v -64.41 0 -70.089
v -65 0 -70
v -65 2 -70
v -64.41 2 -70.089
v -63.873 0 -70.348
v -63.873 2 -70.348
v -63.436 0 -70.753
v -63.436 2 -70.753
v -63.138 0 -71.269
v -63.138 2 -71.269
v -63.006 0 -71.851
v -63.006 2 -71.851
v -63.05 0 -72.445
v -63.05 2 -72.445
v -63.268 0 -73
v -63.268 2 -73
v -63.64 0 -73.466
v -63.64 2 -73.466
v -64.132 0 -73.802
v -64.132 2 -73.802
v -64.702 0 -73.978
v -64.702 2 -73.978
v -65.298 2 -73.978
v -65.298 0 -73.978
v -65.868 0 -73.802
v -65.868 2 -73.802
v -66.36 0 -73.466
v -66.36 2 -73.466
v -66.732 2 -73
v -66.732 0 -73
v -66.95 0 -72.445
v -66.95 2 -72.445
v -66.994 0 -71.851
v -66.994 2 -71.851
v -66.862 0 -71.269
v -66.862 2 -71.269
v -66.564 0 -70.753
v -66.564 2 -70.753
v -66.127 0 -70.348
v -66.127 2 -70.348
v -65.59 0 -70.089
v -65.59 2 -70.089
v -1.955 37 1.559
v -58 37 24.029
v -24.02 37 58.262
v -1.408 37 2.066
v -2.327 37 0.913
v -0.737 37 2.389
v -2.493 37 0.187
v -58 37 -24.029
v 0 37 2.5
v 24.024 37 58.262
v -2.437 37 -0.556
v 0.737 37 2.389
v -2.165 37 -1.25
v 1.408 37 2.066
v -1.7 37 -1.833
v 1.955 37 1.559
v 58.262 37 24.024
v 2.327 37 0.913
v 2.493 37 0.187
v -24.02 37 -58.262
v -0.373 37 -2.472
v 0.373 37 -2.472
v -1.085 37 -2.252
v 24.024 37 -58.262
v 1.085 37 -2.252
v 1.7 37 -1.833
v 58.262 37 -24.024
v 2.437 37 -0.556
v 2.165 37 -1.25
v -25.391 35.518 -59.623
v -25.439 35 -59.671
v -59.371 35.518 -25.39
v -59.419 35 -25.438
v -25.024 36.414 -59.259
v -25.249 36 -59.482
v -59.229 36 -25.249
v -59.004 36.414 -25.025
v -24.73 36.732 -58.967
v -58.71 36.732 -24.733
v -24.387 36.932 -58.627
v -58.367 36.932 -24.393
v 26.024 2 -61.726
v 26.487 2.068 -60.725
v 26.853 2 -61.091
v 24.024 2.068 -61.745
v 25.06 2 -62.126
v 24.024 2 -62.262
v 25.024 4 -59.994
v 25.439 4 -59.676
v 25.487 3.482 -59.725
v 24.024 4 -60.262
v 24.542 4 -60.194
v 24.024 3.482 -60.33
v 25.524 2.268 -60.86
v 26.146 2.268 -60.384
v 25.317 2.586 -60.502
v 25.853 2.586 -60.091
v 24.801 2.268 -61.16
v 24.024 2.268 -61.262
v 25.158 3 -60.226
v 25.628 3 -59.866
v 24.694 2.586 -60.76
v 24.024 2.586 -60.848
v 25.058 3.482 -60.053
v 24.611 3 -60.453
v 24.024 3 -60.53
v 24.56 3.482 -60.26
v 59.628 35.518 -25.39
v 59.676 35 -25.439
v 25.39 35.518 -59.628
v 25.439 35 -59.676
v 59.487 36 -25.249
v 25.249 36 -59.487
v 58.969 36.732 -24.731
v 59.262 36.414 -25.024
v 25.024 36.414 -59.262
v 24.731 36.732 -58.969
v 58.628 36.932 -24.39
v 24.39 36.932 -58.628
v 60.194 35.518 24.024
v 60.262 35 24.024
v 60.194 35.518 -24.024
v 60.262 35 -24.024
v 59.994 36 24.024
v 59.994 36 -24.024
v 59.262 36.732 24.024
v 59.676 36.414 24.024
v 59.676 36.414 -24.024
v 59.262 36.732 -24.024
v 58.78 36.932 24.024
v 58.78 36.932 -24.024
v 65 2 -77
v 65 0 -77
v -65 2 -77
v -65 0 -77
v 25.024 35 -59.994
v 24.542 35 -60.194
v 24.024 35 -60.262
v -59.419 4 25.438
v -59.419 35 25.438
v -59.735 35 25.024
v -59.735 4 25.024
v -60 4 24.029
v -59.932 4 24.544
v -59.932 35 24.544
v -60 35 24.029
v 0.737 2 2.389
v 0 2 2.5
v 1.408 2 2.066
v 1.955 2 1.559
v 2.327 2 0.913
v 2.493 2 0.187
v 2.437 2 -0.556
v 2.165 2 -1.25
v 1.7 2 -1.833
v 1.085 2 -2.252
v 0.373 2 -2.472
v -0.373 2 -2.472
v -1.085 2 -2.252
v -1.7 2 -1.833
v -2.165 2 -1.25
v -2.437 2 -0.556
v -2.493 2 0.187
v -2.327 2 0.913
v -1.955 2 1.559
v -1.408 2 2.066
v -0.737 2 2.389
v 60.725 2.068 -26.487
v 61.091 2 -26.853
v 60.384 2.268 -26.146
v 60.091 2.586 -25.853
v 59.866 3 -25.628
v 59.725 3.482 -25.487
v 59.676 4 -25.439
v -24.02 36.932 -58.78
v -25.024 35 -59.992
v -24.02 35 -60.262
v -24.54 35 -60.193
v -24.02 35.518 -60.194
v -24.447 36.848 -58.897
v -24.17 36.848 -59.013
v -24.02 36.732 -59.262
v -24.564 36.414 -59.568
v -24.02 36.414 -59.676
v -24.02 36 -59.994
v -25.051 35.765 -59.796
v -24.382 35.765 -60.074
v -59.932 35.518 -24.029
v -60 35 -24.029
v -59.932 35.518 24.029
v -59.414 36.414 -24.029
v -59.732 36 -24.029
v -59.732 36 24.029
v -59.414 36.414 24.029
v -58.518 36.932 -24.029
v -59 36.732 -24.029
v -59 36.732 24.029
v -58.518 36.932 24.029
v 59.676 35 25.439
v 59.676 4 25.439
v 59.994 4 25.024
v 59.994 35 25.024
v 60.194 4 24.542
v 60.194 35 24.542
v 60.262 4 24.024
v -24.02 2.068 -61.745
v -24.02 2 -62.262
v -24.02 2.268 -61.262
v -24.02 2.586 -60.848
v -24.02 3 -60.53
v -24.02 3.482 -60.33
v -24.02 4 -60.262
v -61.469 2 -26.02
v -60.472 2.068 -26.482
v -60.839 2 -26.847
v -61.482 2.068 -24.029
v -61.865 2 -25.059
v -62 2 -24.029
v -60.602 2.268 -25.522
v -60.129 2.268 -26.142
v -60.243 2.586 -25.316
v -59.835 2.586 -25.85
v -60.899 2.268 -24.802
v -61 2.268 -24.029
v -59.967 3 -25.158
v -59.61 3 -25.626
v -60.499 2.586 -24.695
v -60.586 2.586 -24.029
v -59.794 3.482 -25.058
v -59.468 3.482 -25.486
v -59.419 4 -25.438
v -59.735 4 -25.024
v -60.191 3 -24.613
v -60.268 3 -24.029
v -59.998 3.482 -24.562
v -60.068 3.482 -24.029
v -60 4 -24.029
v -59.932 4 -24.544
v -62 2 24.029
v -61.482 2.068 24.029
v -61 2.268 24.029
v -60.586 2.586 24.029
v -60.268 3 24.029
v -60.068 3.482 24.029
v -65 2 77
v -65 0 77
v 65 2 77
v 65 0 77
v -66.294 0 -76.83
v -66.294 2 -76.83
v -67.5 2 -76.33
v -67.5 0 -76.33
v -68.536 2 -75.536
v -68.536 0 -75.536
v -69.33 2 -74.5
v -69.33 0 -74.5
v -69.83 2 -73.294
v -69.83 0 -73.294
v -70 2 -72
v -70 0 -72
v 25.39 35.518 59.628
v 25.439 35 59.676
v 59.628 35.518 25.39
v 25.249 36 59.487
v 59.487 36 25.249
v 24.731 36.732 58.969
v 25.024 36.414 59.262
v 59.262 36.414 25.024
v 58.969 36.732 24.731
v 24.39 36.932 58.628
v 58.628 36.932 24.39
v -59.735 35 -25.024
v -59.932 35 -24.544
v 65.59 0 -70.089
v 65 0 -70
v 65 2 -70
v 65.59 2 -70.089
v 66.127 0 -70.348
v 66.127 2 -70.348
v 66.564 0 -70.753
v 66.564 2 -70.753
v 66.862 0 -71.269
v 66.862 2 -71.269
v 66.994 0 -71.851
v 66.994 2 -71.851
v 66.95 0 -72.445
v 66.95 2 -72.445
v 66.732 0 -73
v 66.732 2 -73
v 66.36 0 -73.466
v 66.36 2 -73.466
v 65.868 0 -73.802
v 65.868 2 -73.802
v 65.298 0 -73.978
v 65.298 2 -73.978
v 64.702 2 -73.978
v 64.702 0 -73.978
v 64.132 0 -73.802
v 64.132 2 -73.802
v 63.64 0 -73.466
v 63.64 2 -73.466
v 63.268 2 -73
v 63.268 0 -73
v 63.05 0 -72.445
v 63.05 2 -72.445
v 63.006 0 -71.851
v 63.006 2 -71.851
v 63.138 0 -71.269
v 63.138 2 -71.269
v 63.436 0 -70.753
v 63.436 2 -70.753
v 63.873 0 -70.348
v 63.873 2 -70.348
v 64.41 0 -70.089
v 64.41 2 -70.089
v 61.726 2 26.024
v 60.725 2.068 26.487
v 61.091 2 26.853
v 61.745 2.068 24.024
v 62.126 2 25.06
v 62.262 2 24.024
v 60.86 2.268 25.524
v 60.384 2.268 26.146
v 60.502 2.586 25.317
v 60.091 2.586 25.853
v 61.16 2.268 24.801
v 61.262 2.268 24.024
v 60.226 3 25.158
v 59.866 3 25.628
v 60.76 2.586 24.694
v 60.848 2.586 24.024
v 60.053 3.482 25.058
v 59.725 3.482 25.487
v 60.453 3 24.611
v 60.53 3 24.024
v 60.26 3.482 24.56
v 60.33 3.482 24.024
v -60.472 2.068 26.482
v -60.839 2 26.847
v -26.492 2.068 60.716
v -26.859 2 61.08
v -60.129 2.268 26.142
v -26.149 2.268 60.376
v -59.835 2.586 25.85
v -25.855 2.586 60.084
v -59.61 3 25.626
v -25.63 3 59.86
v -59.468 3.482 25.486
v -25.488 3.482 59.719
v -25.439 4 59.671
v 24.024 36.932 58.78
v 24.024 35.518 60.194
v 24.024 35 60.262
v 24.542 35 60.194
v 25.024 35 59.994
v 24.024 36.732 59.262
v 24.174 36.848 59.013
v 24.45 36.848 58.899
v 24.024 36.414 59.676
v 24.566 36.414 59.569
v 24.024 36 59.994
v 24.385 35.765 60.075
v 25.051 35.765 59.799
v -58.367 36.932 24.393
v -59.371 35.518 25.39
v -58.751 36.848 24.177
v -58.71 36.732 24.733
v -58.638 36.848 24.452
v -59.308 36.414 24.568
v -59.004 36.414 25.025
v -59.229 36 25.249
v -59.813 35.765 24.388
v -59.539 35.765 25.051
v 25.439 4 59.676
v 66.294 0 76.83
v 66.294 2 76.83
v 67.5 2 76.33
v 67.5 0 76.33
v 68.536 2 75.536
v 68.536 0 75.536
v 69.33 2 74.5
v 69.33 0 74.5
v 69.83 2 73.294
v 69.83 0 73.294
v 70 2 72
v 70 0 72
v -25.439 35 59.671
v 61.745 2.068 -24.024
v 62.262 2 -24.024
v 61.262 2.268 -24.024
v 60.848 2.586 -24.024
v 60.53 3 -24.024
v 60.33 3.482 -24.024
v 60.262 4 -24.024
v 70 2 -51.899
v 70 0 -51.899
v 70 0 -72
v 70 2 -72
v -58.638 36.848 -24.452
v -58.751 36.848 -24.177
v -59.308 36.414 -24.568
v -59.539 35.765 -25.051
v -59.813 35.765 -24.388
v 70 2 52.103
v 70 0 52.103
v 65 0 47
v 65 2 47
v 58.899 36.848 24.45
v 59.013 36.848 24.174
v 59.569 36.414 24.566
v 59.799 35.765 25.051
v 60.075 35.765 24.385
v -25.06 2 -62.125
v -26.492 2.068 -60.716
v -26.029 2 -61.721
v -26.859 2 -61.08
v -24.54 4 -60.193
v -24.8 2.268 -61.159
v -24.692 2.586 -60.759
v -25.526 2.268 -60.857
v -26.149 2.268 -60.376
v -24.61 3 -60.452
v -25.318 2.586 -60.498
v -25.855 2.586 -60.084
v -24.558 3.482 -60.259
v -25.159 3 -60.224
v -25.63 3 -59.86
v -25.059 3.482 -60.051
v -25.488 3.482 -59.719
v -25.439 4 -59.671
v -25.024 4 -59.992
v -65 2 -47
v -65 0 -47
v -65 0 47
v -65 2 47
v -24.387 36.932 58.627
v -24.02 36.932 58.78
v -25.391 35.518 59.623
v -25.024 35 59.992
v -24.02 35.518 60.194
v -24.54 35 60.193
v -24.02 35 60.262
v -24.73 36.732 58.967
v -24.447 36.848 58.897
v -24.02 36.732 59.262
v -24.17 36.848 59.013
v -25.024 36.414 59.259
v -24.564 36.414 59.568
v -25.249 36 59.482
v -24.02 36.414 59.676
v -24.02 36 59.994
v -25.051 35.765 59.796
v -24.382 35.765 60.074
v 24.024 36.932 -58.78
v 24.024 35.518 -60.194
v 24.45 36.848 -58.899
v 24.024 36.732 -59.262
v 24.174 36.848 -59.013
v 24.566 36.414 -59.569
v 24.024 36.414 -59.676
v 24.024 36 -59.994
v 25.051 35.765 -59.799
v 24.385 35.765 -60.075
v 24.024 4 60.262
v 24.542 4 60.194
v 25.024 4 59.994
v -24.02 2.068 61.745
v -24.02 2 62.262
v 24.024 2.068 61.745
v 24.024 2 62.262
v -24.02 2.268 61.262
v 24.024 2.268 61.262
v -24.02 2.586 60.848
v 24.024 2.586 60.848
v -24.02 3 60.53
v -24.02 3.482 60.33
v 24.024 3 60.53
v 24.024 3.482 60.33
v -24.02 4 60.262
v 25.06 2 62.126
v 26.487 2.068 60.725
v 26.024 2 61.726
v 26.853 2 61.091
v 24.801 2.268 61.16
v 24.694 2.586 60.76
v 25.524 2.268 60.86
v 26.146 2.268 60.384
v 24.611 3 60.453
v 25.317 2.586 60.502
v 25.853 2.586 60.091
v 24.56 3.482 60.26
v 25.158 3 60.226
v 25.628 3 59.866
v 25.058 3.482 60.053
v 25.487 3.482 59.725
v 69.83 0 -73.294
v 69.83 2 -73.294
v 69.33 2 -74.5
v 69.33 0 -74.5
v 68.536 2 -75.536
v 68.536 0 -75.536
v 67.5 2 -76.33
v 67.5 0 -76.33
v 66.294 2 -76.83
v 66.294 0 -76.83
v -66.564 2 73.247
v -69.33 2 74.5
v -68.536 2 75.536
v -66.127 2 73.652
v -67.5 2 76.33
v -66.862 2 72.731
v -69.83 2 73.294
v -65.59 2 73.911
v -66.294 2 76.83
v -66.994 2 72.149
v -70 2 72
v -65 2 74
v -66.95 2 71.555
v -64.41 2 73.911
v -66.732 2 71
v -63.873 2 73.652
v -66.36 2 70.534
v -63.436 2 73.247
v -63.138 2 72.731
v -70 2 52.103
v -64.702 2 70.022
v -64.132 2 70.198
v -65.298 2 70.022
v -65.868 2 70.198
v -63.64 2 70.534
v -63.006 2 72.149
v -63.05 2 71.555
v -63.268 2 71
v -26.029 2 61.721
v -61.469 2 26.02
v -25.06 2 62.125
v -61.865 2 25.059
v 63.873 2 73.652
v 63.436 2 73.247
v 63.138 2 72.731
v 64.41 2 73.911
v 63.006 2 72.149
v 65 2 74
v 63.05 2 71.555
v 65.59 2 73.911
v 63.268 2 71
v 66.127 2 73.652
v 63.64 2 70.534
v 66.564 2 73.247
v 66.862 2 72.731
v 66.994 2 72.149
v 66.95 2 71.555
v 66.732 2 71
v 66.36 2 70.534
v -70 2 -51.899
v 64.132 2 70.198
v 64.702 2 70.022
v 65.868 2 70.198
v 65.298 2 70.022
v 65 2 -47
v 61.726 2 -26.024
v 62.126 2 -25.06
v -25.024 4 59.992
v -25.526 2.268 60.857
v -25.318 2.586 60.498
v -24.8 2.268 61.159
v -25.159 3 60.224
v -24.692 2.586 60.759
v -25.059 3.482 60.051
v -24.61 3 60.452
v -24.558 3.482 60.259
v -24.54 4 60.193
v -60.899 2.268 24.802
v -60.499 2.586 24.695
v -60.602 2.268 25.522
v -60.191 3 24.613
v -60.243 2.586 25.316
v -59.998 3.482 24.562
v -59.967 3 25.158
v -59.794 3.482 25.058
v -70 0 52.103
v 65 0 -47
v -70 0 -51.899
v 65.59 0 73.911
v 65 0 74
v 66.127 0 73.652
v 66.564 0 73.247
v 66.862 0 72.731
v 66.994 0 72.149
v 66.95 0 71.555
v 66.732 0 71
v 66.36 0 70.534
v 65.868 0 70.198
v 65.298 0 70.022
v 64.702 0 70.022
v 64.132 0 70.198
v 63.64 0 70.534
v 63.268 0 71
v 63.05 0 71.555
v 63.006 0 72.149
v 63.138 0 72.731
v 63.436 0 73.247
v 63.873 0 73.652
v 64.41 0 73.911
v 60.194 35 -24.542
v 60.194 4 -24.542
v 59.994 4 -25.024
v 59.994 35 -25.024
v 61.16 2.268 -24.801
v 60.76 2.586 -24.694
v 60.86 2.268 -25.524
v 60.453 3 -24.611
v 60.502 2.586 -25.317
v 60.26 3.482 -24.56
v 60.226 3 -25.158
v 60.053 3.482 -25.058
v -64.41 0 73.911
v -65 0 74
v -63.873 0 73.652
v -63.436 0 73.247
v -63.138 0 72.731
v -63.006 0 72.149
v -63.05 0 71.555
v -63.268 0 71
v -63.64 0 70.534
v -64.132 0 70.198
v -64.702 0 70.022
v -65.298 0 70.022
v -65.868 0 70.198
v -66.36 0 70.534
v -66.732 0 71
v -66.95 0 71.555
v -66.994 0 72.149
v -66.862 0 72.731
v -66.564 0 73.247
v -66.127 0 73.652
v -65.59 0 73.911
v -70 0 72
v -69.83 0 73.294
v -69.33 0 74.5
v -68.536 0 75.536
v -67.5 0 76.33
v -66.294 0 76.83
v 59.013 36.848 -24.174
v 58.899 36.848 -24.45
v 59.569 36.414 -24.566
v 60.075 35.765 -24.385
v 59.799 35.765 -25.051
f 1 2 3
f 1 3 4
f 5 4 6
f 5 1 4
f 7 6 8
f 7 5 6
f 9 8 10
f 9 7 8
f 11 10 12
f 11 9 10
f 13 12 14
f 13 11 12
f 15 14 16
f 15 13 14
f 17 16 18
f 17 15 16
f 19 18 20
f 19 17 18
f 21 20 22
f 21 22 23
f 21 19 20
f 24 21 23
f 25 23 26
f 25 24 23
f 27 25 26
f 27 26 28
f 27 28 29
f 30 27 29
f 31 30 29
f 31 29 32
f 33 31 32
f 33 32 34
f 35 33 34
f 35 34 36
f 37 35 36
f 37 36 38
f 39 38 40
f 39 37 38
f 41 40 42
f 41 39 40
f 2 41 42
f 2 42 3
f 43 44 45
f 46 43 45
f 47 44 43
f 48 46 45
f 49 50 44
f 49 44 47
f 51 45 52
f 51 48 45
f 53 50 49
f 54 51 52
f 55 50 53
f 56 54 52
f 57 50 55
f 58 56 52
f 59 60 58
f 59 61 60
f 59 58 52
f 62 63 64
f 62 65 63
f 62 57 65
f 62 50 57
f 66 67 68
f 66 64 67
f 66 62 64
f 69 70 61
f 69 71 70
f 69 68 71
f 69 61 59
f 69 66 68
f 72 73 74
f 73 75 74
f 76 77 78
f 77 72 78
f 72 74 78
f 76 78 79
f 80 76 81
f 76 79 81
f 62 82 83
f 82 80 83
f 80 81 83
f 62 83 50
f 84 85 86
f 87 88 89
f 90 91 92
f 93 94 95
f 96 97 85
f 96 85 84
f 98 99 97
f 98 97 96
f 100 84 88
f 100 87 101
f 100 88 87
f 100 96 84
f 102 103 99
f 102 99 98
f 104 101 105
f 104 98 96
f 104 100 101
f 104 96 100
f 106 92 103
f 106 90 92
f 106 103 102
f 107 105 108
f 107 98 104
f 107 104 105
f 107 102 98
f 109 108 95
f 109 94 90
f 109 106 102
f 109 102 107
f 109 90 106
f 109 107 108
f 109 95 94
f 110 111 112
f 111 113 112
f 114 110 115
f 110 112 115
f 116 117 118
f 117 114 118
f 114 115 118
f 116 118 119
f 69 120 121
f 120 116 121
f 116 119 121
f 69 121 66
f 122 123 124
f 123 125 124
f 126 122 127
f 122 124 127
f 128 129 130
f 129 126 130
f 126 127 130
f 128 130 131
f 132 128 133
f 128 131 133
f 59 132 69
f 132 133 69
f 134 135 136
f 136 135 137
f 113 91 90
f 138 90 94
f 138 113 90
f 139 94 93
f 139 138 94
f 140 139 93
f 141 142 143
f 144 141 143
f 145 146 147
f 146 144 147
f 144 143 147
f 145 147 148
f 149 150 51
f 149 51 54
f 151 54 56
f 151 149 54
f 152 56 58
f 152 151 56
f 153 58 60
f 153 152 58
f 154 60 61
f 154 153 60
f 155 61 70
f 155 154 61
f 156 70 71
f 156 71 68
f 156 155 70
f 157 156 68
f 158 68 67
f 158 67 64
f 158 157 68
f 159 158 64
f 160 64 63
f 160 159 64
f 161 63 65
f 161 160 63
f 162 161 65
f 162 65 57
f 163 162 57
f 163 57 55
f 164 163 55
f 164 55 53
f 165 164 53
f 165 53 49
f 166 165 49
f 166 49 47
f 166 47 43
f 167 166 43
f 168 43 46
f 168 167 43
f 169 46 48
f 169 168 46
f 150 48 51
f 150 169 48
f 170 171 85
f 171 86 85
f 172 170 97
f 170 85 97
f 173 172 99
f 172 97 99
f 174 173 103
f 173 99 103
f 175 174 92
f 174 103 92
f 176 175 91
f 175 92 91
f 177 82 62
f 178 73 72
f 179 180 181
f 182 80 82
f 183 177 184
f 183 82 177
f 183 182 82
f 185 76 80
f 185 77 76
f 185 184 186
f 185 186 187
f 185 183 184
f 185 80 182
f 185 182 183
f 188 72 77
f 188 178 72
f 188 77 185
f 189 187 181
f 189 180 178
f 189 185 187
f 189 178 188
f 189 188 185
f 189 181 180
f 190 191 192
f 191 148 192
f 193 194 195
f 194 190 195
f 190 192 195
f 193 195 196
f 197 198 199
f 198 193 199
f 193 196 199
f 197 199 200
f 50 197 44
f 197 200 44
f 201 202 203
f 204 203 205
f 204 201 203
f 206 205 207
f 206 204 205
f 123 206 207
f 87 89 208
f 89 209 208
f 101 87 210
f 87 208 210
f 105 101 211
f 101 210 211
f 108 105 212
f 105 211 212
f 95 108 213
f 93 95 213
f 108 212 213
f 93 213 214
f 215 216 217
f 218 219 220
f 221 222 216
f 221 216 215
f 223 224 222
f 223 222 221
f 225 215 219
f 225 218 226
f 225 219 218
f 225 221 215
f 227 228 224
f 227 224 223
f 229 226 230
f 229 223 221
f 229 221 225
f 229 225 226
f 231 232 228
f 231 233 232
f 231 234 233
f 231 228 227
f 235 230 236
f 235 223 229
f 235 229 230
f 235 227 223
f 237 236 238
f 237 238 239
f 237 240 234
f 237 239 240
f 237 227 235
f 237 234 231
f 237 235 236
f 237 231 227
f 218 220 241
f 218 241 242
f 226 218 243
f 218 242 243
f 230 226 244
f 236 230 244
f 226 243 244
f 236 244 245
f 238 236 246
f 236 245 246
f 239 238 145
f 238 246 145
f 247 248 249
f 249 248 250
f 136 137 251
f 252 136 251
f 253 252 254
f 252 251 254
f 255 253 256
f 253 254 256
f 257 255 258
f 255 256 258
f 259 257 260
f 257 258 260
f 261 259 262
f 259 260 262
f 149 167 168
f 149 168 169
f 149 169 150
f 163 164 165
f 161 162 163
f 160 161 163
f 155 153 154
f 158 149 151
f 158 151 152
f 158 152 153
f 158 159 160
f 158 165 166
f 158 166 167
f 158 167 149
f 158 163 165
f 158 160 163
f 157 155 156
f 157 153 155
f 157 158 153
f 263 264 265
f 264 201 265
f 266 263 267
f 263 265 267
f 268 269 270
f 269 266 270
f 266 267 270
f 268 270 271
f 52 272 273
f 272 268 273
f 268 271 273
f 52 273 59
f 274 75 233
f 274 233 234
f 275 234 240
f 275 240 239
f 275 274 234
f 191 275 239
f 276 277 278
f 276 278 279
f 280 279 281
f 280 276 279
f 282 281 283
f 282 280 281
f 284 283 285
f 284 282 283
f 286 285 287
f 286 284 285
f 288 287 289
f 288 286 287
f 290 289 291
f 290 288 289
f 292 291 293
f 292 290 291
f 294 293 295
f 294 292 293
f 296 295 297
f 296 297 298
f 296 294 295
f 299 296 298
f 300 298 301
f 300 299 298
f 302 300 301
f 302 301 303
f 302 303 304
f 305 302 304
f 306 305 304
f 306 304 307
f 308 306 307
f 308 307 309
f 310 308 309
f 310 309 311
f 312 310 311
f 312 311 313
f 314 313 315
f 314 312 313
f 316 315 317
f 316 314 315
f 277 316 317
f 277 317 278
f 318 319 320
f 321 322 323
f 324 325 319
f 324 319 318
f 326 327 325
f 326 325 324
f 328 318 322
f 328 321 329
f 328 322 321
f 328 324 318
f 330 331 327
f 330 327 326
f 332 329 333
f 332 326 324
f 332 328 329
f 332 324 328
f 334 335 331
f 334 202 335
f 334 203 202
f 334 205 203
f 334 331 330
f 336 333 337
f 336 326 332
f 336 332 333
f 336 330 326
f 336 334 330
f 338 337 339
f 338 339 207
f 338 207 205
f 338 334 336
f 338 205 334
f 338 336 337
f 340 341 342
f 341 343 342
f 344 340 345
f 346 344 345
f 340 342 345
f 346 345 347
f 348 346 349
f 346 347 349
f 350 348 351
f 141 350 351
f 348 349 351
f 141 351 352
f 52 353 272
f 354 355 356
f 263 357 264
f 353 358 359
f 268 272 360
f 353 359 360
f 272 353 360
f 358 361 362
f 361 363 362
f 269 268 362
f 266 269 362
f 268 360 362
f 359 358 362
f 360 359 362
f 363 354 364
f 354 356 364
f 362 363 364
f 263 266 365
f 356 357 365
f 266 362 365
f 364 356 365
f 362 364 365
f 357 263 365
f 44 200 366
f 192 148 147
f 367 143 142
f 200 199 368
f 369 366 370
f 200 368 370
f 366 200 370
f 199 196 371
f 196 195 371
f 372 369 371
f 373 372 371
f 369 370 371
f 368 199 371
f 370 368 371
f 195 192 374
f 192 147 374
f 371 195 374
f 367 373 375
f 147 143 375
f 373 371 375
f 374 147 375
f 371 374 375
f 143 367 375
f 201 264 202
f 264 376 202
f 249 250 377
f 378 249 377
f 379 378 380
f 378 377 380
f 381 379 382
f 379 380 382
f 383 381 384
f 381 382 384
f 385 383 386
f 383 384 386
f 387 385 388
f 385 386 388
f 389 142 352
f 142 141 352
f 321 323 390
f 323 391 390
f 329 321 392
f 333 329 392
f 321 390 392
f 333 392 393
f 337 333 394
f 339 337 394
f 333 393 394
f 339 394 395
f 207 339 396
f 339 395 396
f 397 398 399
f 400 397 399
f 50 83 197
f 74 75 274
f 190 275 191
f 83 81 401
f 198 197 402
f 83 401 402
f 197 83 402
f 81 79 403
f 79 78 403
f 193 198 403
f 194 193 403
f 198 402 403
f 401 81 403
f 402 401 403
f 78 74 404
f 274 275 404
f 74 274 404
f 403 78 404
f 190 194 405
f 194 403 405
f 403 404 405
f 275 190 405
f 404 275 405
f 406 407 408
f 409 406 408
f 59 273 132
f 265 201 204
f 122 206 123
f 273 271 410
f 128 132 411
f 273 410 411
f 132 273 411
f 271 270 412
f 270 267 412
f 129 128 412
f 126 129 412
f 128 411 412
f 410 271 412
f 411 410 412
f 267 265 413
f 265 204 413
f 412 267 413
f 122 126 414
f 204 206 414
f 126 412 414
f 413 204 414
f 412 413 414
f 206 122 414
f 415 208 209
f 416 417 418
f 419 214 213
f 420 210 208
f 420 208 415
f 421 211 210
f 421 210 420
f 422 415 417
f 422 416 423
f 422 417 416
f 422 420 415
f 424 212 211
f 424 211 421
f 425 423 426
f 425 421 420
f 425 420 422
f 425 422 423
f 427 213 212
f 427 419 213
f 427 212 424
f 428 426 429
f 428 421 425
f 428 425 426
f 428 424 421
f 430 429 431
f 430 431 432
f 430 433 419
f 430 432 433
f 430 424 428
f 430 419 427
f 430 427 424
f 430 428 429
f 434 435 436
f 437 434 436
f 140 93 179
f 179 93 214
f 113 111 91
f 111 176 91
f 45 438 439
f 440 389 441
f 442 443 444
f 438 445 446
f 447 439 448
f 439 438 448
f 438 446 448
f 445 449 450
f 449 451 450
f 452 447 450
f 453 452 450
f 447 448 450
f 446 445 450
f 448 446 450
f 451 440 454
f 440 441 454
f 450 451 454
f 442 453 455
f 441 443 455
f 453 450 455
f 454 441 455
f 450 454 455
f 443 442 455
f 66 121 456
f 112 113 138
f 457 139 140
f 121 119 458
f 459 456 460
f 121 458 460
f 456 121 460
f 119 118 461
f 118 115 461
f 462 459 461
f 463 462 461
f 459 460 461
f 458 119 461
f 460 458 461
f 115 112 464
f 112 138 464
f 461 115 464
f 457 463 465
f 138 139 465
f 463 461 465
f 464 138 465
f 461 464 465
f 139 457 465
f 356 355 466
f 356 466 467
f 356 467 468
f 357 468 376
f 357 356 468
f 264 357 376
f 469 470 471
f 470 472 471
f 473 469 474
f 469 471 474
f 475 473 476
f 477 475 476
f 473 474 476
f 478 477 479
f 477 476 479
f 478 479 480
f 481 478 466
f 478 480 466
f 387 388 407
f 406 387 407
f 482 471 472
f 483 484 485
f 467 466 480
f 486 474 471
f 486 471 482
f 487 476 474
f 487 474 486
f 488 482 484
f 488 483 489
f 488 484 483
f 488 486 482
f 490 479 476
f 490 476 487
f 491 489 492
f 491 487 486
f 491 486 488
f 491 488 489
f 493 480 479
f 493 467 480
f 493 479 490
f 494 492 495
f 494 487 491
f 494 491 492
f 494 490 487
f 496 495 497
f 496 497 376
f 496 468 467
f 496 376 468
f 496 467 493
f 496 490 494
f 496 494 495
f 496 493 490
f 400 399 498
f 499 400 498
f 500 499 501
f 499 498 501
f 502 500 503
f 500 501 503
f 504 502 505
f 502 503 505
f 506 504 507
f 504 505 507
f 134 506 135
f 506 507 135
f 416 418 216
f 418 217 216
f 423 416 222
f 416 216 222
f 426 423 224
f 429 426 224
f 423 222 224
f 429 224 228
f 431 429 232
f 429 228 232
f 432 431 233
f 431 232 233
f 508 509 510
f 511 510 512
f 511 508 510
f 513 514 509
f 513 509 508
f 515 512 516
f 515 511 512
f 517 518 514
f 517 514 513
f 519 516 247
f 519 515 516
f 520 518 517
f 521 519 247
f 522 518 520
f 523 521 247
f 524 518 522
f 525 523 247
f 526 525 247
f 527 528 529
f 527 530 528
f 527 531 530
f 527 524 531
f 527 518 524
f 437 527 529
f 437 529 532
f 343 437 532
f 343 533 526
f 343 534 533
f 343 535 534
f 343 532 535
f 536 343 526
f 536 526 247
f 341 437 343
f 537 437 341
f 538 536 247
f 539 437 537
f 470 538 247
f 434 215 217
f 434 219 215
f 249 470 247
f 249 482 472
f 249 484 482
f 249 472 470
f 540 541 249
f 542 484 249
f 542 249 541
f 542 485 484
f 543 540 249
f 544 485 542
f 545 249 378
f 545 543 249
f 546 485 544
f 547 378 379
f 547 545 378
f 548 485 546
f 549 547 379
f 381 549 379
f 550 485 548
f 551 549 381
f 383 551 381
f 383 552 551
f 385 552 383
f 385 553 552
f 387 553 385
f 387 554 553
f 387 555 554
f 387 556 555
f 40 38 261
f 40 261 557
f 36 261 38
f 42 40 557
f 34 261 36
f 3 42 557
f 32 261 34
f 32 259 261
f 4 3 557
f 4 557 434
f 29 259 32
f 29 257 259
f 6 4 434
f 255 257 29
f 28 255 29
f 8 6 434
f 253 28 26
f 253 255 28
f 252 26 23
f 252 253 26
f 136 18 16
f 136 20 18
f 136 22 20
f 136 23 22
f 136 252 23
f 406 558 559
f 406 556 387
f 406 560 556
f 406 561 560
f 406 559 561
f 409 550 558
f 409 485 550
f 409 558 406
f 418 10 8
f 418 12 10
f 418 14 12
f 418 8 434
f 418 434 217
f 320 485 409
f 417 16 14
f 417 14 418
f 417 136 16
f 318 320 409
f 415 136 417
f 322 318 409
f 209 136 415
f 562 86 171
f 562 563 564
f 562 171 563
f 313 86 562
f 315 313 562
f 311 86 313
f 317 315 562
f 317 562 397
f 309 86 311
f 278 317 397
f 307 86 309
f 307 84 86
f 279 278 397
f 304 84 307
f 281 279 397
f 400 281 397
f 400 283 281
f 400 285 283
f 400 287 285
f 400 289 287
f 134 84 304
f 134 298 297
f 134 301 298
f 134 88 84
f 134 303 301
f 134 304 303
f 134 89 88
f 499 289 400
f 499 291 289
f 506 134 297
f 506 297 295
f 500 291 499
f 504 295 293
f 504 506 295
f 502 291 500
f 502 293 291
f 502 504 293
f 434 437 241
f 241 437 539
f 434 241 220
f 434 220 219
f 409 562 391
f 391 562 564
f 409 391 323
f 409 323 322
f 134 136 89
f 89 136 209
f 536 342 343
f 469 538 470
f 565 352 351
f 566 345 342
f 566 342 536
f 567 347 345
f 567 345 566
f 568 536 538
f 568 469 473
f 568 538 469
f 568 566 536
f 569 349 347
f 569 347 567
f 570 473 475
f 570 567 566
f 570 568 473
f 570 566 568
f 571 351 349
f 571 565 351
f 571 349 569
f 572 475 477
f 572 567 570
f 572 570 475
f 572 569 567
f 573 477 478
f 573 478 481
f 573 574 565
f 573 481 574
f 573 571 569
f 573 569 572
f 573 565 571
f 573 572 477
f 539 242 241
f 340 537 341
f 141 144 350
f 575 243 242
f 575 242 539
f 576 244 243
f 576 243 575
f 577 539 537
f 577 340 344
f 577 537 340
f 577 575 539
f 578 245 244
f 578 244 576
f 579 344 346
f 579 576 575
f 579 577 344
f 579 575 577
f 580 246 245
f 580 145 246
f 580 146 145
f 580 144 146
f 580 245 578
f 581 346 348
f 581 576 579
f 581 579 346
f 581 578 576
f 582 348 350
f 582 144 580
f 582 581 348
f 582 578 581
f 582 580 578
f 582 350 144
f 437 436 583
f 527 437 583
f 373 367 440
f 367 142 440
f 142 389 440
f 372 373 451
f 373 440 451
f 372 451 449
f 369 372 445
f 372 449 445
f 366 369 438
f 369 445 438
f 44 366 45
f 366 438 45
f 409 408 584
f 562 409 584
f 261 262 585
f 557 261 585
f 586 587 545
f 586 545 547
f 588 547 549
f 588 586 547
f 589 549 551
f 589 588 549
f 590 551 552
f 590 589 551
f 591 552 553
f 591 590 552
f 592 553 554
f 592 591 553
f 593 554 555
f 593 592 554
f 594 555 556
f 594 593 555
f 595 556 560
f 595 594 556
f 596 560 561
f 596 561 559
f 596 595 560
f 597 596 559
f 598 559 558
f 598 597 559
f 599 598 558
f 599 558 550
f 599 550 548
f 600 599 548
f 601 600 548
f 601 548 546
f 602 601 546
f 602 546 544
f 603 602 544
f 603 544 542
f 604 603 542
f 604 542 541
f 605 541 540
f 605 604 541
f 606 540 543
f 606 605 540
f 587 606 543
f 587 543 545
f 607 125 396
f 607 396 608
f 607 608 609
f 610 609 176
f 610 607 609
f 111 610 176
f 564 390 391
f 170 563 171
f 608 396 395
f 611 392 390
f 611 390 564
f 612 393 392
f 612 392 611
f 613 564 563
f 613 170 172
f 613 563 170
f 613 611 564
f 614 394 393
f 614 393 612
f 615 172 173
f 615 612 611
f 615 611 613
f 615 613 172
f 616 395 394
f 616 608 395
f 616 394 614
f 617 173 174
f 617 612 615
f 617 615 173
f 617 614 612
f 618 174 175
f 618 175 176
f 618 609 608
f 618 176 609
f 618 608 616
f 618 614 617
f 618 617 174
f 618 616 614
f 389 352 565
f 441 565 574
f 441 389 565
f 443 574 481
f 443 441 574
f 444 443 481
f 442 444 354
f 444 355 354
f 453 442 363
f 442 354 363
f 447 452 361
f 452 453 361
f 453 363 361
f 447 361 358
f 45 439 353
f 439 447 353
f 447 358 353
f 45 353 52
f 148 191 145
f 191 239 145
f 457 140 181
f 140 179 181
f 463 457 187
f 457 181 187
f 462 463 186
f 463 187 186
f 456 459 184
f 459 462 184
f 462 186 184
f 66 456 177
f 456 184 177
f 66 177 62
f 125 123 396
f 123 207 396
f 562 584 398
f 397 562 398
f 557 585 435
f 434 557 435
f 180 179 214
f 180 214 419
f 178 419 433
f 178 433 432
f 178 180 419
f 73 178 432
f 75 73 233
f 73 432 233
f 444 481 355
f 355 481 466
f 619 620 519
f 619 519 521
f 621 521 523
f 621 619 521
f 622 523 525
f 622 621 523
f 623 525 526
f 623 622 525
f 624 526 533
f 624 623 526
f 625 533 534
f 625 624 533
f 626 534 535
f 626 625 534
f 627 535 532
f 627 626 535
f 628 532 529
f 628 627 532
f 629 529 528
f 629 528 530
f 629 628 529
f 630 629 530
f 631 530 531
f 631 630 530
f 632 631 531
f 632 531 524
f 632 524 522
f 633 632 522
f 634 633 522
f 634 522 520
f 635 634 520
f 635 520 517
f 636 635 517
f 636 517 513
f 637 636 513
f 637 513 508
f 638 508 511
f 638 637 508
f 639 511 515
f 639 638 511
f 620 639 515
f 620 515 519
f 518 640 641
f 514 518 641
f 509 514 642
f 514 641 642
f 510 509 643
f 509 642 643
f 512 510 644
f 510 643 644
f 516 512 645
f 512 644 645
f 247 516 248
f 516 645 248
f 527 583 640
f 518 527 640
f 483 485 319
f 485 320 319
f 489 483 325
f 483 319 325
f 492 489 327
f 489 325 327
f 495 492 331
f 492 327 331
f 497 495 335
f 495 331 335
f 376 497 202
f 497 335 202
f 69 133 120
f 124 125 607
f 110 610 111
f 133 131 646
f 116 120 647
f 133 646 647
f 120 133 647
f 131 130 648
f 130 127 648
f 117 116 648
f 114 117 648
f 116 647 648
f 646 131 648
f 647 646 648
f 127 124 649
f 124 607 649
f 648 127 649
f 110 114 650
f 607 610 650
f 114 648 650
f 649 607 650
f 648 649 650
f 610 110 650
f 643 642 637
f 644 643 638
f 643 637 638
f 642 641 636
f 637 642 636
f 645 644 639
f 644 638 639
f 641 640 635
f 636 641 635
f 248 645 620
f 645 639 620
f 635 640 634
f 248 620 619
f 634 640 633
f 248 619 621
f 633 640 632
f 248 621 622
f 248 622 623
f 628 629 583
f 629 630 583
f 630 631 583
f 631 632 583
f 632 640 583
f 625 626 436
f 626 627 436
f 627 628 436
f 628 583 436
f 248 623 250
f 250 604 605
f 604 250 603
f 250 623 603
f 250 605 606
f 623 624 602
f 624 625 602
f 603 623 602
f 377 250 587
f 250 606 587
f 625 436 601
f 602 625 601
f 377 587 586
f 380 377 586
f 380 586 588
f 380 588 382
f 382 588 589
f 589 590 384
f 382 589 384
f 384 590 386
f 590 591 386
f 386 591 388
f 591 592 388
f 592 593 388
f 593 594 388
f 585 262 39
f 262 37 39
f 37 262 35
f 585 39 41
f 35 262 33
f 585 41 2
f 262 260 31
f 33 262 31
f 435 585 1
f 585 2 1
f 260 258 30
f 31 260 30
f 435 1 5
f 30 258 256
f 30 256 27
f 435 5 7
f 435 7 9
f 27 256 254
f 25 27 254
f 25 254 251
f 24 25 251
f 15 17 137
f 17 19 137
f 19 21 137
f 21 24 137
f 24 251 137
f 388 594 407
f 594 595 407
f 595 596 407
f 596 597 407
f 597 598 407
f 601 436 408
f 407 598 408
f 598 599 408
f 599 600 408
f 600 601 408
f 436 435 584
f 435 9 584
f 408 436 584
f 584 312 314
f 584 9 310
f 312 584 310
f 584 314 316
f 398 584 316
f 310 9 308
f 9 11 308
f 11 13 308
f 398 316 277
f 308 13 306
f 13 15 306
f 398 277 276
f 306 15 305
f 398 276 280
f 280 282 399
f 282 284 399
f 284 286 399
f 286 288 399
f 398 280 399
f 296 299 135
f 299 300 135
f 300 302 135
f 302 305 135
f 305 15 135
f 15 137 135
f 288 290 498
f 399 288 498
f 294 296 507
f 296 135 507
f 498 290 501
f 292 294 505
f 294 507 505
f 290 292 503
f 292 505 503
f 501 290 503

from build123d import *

# Parameters (mm, degrees)
SKETCH1_R           = 2
BOSS_EXTRUDE1_DEPTH = 2
SKETCH2_R           = 2.5
BOSS_EXTRUDE2_DEPTH = 35
FILLET1_R           = 2


with BuildPart() as part:
    # Sketch1 → Boss-Extrude1 (new body)
    with BuildSketch(Plane(origin=(0, 0, 0), x_dir=(1, 0, 0), z_dir=(0, 1, 0))):
        with BuildLine():
            Line((-65, 47), (-65, -47))
            Line((-65, -47), (-70, -52.103103631))
            Line((-70, -52.103103631), (-70, -72))
            ThreePointArc((-70, -72), (-68.535533906, -75.535533906), (-65, -77))
            Line((-65, -77), (65, -77))
            ThreePointArc((65, -77), (68.535533906, -75.535533906), (70, -72))
            Line((70, -72), (70, -52.103103631))
            Line((70, -52.103103631), (65, -47))
            Line((65, -47), (65, 47))
            Line((65, 47), (70, 51.898979486))
            Line((70, 51.898979486), (70, 72))
            ThreePointArc((70, 72), (68.535533906, 75.535533906), (65, 77))
            Line((65, 77), (-65, 77))
            ThreePointArc((-65, 77), (-68.535533906, 75.535533906), (-70, 72))
            Line((-70, 72), (-70, 51.898979486))
            Line((-70, 51.898979486), (-65, 47))
        make_face()
        with Locations(Location((-65, -72, 0), (0, 0, 270))):
            Circle(SKETCH1_R, mode=Mode.SUBTRACT)
        with Locations(Location((65, -72, 0), (0, 0, 270))):
            Circle(SKETCH1_R, mode=Mode.SUBTRACT)
        with Locations(Location((-65, 72, 0), (0, 0, 270))):
            Circle(SKETCH1_R, mode=Mode.SUBTRACT)
        with Locations(Location((65, 72, 0), (0, 0, 270))):
            Circle(SKETCH1_R, mode=Mode.SUBTRACT)
    extrude(amount=BOSS_EXTRUDE1_DEPTH)

    # Sketch2 → Boss-Extrude2 (add)
    with BuildSketch(Plane(origin=(0, 2, 0), x_dir=(1, 0, 0), z_dir=(0, 1, 0))):
        Polygon((-60, -24.852813742), (-24.852813742, -60.262270904), (24.852813742, -60.262270904), (60.262270904, -24.852813742), (60.262270904, 24.852813742), (24.852813742, 60.262270904), (-24.852813742, 60.262270904), (-60, 24.852813742), align=None)
        with Locations(Location((0, 0, 0), (0, 0, 270))):
            Circle(SKETCH2_R, mode=Mode.SUBTRACT)
    extrude(amount=BOSS_EXTRUDE2_DEPTH)

    # Fillet1
    fillet1_edges = [part.edges().sort_by_distance(p)[0] for p in [
        (-42.426406871, 37, -42.557542323),
        (-60, 37, 0),
        (-42.426406871, 37, 42.557542323),
        (0, 37, 60.262270904),
        (42.557542323, 37, 42.557542323),
        (60.262270904, 37, 0),
        (42.557542323, 37, -42.557542323),
        (0, 37, -60.262270904),
        (-42.426406871, 2, -42.557542323),
        (-24.852813742, 19.5, -60.262270904),
        (-60, 2, 0),
        (-60, 19.5, -24.852813742),
        (-42.426406871, 2, 42.557542323),
        (-60, 19.5, 24.852813742),
        (0, 2, 60.262270904),
        (-24.852813742, 19.5, 60.262270904),
        (42.557542323, 2, 42.557542323),
        (24.852813742, 19.5, 60.262270904),
        (60.262270904, 2, 0),
        (60.262270904, 19.5, 24.852813742),
        (42.557542323, 2, -42.557542323),
        (60.262270904, 19.5, -24.852813742),
        (0, 2, -60.262270904),
        (24.852813742, 19.5, -60.262270904),
    ]]
    fillet(fillet1_edges, radius=FILLET1_R)


solid = part.part
